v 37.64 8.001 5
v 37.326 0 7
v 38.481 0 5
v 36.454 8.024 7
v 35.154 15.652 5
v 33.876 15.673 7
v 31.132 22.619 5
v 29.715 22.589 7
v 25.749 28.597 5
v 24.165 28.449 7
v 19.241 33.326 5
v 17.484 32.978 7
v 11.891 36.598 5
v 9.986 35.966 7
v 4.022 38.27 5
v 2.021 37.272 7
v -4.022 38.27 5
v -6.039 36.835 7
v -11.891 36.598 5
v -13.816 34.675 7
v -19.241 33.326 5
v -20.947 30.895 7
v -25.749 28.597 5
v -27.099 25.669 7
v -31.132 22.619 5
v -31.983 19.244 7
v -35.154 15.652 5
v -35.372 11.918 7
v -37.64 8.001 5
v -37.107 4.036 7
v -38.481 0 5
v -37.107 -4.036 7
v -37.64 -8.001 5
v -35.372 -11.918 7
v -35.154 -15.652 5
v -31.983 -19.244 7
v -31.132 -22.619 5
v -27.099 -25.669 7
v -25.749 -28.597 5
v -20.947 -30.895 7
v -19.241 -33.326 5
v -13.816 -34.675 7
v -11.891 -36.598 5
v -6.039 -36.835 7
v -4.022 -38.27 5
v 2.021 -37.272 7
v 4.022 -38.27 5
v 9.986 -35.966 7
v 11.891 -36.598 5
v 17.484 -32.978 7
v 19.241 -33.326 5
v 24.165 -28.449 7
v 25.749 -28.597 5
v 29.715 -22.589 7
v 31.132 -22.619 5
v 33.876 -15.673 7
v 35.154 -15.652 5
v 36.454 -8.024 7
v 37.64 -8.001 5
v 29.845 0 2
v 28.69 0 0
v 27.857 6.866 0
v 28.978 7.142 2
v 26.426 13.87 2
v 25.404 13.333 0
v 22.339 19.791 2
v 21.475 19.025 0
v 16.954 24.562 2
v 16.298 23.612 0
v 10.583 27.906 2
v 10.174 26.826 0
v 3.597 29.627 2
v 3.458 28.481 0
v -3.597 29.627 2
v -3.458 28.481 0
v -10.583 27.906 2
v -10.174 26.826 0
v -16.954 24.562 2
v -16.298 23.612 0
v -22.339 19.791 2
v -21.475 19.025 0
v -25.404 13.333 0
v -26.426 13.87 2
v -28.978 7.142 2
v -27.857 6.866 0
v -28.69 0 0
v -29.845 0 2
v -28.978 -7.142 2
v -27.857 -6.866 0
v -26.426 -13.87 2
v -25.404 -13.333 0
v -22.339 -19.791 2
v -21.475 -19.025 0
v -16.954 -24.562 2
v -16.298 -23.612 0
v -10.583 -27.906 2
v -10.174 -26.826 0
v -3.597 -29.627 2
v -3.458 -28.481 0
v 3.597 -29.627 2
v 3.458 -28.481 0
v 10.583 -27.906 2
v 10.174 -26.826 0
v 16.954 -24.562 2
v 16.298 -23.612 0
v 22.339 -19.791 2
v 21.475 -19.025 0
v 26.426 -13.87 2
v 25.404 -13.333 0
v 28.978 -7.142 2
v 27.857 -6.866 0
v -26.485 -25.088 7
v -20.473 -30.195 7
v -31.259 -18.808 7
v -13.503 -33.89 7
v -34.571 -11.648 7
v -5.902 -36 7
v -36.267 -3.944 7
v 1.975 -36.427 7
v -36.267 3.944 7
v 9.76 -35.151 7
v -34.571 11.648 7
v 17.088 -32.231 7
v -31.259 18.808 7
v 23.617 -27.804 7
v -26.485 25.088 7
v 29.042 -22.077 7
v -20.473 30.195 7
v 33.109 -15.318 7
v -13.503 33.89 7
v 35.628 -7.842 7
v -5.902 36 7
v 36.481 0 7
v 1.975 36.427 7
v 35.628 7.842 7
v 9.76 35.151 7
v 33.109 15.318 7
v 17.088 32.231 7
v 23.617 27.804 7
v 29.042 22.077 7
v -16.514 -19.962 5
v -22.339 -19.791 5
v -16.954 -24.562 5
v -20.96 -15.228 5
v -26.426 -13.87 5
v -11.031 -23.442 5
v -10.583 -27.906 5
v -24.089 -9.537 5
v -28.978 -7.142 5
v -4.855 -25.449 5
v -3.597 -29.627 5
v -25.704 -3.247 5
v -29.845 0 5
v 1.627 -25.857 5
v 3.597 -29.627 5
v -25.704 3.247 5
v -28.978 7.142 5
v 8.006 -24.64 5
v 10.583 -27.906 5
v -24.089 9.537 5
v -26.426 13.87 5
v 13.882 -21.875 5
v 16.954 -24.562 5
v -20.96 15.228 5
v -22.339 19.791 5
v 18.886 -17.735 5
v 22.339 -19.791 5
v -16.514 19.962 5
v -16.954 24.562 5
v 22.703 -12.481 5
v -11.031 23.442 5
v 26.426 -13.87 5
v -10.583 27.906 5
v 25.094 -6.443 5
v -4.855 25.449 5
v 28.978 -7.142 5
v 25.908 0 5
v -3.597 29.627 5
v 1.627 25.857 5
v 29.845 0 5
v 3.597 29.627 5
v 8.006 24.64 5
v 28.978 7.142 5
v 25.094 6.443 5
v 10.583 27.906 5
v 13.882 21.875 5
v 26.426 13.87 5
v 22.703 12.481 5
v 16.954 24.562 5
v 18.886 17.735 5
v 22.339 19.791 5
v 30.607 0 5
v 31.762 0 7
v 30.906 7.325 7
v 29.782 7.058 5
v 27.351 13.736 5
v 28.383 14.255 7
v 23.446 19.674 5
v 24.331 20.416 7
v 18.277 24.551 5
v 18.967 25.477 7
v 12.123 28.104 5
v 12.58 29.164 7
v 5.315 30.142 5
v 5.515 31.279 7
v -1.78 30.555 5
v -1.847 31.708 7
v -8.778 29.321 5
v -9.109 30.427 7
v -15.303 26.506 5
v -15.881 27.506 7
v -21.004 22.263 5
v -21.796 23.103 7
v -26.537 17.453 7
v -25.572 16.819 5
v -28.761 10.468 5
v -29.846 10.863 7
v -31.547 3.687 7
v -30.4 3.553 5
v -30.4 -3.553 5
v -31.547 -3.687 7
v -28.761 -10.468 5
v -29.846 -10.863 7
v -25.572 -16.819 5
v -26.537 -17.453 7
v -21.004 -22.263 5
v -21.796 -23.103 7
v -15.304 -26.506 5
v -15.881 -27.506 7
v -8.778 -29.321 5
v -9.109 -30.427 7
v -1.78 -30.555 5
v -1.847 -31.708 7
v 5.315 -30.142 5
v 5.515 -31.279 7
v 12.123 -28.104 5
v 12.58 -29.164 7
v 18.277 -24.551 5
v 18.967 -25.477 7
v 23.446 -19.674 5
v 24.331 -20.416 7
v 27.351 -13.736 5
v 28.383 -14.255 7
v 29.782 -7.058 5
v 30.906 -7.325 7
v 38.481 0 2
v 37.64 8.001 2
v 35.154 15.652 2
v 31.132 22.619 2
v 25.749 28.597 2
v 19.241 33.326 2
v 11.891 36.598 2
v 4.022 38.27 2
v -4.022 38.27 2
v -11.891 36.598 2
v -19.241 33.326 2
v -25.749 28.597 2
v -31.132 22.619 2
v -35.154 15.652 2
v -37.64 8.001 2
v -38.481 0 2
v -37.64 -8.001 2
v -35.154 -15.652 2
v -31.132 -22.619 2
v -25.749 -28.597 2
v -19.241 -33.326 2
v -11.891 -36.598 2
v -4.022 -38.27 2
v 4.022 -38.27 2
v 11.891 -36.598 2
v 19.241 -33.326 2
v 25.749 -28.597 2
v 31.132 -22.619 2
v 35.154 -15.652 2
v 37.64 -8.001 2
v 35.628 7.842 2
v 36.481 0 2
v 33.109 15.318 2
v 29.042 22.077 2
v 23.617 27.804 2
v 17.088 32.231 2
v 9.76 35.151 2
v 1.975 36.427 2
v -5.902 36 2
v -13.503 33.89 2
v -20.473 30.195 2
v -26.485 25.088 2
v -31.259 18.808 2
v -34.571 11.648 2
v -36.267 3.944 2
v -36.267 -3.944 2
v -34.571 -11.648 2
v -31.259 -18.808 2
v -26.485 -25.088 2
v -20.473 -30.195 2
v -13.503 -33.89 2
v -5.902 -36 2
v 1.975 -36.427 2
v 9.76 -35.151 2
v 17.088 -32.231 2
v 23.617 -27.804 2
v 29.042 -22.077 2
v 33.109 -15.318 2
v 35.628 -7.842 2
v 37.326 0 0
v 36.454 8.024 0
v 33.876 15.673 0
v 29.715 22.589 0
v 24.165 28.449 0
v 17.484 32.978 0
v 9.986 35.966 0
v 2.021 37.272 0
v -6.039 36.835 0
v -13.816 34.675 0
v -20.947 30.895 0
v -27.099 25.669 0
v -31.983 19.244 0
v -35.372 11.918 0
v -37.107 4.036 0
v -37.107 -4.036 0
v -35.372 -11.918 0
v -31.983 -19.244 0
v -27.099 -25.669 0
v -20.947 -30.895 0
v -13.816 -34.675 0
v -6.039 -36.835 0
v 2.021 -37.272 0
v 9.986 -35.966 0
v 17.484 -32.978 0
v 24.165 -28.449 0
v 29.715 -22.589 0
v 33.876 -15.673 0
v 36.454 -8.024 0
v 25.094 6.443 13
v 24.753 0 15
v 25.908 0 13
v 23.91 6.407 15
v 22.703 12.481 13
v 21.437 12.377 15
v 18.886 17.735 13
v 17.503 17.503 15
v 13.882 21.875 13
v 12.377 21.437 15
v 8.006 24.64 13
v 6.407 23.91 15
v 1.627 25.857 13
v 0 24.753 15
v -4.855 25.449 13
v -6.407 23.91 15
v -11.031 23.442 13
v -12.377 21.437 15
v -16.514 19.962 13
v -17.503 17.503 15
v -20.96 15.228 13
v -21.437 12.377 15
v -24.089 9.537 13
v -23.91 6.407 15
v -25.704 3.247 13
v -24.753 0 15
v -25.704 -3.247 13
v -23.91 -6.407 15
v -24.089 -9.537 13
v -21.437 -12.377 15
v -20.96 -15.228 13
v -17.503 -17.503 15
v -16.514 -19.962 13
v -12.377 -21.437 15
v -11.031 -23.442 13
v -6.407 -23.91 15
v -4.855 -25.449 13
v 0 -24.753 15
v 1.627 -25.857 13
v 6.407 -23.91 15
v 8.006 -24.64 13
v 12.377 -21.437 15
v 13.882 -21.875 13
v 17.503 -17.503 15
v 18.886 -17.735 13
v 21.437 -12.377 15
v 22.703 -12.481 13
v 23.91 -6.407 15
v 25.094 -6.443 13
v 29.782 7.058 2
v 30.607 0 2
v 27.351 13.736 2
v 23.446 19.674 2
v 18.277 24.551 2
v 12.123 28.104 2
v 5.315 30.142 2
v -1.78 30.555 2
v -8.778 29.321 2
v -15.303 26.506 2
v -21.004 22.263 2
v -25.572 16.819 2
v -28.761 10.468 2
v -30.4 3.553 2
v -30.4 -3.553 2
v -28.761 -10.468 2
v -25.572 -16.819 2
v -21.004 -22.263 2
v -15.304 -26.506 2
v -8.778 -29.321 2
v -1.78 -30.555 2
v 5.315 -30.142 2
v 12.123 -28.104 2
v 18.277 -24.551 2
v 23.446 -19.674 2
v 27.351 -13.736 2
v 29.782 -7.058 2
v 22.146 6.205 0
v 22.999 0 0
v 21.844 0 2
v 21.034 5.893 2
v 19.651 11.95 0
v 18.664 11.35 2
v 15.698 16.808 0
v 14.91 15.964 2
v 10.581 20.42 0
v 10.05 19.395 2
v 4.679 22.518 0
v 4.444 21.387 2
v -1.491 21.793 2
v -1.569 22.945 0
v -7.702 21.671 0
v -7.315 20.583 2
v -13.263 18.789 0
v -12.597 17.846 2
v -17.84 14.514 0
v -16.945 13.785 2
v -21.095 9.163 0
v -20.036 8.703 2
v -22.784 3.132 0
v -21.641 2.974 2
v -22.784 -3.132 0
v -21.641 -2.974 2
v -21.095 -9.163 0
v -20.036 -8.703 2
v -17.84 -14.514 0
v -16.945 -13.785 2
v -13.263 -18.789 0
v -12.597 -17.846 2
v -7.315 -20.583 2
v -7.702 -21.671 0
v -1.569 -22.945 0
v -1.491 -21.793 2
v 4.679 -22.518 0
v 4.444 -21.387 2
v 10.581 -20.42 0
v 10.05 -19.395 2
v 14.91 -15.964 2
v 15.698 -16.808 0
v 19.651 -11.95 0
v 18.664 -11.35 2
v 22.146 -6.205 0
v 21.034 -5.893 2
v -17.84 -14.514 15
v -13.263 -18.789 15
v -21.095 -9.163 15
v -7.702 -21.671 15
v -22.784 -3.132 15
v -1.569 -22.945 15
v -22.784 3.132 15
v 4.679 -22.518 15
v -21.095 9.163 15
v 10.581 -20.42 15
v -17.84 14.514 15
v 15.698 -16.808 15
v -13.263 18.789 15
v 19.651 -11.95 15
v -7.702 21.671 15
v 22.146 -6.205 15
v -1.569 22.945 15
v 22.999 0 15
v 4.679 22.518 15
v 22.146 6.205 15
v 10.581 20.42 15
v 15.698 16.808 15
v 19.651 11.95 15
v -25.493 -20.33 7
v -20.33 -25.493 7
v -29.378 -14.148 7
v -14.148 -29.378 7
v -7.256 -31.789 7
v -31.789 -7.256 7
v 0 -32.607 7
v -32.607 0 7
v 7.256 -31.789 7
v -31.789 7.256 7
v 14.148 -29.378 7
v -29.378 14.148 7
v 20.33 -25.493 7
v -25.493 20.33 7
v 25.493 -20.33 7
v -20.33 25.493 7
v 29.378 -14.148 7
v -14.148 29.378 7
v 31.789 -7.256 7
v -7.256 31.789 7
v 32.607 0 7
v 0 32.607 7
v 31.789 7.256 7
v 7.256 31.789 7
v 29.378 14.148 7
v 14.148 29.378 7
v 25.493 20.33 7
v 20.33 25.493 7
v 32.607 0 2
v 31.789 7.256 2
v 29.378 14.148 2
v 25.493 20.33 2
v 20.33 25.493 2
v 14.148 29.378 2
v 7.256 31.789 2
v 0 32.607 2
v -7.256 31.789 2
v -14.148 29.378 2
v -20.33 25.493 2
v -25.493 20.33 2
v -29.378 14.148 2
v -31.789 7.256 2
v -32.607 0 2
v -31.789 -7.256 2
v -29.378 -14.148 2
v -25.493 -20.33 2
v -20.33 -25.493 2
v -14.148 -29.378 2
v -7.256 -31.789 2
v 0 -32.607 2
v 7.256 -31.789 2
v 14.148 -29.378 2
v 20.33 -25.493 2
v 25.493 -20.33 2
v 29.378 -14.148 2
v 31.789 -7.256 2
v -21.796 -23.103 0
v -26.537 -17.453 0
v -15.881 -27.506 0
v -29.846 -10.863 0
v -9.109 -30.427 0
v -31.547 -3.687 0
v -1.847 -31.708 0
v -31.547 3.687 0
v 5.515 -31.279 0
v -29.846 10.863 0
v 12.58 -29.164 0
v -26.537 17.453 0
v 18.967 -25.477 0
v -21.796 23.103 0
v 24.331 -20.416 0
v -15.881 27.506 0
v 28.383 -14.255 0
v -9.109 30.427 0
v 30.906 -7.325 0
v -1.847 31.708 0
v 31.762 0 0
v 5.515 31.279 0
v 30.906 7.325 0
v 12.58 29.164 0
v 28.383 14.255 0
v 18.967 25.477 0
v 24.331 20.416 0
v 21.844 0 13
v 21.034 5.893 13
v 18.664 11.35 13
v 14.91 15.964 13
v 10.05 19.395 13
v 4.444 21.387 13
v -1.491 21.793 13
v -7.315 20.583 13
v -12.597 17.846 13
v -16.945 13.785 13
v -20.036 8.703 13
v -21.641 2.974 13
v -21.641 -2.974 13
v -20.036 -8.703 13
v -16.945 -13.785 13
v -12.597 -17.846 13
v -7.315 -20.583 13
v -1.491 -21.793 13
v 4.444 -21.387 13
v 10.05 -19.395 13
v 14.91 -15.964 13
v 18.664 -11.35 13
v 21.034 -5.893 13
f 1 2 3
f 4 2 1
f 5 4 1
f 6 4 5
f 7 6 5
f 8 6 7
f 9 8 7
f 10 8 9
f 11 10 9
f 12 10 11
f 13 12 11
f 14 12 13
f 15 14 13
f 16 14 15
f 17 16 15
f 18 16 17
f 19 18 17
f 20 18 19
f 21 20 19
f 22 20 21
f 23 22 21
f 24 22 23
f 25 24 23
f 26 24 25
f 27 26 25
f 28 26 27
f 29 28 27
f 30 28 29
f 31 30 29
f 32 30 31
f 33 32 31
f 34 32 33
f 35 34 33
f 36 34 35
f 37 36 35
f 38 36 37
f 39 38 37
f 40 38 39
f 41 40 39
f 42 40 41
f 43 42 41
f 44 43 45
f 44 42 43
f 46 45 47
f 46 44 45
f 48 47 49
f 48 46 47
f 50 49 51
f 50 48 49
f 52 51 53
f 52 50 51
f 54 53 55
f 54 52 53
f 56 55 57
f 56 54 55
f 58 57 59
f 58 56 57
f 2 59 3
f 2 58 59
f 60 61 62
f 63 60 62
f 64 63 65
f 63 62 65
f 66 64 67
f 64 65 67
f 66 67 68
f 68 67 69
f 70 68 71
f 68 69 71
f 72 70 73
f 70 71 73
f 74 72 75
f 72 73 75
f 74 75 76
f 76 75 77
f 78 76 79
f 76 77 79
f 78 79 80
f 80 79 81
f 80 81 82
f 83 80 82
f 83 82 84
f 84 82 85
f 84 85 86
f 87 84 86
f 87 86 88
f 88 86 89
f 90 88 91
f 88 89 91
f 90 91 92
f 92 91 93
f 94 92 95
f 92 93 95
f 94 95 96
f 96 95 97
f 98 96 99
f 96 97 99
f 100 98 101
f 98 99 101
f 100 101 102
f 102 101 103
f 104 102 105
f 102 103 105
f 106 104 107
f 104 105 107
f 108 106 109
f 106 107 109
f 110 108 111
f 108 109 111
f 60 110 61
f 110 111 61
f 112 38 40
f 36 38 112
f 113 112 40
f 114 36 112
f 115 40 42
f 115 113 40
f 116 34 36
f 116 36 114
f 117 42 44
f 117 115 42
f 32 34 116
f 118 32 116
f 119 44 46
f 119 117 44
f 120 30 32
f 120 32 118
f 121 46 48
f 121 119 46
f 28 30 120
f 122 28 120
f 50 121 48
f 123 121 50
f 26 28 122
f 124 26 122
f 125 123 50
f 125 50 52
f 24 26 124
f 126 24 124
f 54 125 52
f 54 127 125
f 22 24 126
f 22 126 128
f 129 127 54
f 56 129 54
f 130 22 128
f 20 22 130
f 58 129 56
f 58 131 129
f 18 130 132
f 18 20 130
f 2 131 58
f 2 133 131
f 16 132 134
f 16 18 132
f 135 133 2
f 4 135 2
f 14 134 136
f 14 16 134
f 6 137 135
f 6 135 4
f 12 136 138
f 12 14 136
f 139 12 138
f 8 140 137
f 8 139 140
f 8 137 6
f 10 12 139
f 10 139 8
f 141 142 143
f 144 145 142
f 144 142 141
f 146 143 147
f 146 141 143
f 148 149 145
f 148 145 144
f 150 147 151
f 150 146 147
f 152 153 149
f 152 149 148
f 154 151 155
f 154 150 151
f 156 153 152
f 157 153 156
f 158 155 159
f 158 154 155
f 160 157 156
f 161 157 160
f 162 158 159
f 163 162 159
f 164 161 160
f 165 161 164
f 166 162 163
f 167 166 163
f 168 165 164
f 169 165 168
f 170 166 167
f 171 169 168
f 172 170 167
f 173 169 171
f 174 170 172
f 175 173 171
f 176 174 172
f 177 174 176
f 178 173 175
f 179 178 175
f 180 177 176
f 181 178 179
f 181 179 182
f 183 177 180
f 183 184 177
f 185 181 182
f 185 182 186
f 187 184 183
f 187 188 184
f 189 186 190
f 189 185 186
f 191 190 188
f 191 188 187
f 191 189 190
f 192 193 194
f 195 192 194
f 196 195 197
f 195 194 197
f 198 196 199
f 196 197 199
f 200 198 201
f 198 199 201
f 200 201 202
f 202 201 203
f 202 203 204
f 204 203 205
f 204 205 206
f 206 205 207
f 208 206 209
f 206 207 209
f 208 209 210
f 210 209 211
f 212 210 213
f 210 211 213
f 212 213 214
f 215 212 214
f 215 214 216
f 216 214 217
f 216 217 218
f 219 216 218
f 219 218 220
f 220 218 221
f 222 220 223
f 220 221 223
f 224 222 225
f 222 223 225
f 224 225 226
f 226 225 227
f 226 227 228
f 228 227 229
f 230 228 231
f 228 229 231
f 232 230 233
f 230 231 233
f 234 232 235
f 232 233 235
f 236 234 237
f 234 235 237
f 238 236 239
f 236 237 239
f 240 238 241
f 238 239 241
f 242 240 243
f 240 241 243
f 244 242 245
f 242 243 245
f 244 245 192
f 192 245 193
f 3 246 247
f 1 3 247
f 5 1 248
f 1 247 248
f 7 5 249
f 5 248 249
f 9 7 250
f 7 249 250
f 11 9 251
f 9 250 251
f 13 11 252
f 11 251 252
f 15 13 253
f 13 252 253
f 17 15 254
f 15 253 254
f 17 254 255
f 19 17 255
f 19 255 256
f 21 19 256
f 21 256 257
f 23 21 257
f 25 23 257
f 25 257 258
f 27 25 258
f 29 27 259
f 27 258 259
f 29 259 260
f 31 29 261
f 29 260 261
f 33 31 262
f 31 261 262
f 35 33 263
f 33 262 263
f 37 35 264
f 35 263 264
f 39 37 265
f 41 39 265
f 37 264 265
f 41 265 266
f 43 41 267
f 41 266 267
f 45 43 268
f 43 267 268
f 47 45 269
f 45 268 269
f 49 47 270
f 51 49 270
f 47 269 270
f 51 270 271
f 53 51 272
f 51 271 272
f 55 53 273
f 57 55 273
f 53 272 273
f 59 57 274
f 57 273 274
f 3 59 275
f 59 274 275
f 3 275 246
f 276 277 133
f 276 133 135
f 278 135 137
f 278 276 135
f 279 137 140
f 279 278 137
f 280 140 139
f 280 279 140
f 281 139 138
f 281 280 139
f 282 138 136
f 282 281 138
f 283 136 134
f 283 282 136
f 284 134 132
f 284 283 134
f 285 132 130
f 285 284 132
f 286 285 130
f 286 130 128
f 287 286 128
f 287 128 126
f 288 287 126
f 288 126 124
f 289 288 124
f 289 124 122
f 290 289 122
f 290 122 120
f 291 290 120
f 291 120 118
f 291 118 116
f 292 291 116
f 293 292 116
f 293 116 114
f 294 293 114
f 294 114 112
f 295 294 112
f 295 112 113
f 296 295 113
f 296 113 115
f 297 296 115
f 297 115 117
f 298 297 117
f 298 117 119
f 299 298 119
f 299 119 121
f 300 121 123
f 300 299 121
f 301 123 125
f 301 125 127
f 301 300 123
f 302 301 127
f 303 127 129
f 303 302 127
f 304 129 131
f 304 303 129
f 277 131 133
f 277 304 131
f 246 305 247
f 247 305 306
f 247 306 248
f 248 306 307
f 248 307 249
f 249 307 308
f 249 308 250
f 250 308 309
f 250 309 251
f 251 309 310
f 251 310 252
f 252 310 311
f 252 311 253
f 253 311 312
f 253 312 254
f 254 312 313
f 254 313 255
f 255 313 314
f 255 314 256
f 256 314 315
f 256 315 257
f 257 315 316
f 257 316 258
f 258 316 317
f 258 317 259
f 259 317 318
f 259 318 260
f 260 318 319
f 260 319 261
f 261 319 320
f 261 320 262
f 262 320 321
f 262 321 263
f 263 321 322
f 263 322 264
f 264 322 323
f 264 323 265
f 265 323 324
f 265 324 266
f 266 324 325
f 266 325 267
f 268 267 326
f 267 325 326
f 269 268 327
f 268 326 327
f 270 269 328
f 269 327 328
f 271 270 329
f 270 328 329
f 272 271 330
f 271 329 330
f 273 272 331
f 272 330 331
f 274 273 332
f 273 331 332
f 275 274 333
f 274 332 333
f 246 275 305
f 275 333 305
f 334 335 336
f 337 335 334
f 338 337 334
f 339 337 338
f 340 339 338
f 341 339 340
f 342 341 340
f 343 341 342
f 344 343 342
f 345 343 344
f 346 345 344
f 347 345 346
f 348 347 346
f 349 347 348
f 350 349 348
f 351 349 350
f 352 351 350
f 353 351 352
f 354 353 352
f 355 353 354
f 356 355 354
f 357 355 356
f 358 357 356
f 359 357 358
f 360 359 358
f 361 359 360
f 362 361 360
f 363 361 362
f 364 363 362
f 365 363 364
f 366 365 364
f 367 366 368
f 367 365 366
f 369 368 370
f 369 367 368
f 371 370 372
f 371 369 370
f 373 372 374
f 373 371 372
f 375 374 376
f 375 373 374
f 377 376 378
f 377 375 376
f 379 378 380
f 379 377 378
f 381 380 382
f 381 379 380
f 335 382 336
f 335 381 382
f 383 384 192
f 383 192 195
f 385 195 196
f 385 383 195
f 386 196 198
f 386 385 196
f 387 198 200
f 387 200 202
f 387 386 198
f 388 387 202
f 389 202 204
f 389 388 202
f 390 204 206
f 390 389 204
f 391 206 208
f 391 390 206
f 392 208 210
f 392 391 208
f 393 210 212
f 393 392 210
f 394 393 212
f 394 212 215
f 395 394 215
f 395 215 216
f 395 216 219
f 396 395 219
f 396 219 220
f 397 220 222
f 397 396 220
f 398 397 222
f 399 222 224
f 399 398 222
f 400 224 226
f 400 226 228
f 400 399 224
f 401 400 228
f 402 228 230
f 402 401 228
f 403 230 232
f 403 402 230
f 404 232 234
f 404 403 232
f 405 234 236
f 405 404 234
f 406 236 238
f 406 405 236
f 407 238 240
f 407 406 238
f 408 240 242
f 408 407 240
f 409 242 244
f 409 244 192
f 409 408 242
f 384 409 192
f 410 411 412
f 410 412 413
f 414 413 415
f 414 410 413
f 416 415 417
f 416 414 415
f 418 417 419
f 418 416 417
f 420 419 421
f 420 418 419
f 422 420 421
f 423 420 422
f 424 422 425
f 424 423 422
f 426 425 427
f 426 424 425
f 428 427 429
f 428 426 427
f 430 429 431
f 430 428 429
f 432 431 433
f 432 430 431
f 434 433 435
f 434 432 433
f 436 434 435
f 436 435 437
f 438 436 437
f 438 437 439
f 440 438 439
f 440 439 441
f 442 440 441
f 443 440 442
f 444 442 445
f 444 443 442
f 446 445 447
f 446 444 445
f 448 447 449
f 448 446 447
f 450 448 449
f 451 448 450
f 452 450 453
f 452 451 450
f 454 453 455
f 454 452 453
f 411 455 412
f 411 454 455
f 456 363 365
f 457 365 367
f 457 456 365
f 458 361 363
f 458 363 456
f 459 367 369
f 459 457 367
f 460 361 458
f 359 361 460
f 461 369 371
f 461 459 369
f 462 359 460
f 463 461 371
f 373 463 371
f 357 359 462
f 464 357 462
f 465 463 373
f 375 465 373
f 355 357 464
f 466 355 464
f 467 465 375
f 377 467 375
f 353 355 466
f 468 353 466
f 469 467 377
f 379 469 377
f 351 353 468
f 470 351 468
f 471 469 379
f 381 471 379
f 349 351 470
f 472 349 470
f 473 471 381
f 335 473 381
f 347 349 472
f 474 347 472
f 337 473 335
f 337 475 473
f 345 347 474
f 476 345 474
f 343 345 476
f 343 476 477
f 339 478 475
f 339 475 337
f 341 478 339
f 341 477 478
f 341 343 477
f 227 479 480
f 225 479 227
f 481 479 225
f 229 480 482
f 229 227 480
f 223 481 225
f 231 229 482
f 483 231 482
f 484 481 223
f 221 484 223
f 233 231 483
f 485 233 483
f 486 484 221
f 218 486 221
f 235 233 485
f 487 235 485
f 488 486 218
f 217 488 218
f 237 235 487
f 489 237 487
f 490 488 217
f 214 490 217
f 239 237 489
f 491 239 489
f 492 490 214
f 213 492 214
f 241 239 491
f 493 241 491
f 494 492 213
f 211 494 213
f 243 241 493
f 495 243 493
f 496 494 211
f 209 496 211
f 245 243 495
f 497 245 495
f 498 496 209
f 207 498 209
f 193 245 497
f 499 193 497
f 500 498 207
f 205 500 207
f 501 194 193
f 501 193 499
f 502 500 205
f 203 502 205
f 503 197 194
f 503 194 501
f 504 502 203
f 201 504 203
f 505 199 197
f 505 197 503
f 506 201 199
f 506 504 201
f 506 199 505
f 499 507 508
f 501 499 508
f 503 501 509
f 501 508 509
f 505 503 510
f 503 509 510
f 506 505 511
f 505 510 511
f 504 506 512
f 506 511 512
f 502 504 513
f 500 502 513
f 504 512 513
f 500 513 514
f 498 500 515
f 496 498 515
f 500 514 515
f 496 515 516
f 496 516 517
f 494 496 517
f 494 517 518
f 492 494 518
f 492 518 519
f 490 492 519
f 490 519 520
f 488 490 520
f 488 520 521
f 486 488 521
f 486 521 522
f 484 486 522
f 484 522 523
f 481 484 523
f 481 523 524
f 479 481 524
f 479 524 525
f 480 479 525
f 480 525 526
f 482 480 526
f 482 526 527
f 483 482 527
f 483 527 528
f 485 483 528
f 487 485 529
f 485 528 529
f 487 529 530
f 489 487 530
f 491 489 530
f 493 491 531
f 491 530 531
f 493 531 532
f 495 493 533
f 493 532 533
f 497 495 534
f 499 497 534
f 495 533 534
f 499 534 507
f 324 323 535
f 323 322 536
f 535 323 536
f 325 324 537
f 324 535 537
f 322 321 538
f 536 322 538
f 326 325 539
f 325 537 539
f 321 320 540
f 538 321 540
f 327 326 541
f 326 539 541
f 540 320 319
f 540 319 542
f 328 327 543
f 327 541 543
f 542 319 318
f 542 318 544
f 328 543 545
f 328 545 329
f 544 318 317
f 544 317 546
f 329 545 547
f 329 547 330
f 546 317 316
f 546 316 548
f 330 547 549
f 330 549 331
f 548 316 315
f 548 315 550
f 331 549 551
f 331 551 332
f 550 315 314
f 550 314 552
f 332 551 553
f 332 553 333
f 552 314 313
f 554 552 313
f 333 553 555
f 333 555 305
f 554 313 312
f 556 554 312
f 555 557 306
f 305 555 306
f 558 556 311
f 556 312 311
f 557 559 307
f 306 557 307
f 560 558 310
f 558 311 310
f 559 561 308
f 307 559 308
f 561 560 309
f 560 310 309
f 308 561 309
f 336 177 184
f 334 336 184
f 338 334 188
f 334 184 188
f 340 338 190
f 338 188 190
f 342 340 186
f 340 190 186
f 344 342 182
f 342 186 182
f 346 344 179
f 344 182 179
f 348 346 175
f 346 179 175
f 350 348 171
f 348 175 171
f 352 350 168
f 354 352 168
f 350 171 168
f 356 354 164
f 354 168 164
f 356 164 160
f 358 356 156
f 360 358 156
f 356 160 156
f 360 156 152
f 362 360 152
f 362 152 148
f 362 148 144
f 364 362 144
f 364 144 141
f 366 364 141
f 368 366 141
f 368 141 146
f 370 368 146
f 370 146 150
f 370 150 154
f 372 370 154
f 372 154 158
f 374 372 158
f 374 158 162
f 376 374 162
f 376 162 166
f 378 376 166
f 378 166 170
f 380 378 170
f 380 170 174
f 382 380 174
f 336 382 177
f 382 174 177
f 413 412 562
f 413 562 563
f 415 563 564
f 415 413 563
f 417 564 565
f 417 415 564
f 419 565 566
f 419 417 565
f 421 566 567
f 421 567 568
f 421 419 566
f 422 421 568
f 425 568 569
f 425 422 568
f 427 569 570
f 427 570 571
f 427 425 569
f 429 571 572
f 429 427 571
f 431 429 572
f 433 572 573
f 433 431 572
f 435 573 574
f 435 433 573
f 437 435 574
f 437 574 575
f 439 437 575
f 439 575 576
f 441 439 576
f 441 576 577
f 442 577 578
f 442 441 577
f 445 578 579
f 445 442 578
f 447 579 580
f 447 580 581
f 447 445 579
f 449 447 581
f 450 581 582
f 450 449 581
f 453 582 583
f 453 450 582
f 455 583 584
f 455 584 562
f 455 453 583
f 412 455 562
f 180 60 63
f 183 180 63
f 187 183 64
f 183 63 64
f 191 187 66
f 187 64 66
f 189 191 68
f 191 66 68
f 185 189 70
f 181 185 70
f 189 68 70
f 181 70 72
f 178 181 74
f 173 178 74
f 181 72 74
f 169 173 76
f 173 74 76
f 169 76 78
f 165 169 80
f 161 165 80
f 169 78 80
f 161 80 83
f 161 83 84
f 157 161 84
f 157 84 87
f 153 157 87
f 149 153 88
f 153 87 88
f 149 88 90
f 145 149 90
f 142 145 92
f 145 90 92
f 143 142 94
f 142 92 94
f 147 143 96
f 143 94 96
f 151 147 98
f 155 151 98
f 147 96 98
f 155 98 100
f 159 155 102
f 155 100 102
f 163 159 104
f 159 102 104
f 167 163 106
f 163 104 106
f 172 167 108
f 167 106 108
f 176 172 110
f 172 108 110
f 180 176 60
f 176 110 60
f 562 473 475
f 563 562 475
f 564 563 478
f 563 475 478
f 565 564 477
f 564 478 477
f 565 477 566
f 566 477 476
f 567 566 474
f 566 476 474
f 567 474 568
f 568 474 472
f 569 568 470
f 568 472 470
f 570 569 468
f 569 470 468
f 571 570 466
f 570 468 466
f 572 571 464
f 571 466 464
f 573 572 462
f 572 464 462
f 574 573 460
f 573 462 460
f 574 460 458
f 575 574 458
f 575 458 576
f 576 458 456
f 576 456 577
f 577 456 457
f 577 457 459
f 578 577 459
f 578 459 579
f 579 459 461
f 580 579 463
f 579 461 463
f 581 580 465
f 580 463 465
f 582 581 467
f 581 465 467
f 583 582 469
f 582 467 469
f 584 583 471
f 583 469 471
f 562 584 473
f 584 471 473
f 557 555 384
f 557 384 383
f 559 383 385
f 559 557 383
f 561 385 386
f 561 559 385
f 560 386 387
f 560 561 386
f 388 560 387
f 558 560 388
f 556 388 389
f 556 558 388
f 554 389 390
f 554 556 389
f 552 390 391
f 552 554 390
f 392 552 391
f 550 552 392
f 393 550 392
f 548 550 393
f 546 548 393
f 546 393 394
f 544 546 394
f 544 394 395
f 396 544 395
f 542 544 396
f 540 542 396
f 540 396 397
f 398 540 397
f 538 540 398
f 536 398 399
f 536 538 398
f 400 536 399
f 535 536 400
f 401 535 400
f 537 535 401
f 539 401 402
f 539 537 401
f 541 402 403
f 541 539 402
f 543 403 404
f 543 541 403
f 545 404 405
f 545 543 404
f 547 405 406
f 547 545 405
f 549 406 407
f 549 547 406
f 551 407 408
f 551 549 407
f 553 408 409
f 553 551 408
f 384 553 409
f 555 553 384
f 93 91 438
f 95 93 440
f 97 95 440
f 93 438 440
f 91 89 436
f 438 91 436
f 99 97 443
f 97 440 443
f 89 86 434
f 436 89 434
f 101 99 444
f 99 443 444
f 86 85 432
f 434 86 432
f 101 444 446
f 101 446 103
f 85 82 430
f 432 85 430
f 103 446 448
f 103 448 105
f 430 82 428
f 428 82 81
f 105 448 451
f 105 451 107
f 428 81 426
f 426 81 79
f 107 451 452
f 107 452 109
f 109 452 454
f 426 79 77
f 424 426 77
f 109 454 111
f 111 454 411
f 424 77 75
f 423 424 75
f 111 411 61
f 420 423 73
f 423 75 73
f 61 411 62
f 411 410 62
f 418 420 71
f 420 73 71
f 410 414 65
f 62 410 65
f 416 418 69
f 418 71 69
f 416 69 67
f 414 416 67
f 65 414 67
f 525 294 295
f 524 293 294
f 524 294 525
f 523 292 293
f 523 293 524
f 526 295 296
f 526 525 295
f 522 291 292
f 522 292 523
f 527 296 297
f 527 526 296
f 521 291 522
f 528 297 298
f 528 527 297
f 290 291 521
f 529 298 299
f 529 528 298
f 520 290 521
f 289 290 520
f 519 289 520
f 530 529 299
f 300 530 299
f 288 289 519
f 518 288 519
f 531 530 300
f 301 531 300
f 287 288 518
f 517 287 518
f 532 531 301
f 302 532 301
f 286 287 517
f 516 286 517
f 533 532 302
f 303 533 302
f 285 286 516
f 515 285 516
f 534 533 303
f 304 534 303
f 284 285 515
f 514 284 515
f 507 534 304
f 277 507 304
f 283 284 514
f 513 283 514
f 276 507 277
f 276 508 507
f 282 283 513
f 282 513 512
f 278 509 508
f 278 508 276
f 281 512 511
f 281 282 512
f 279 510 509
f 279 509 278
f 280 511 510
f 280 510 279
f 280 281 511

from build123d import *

# Parameters (mm, degrees)
F0_R       = 38.481
F0_R_2     = 36.481
F0_R_3     = 32.607
F0_R_4     = 30.607
F1_DEPTH   = 2
F2_DEPTH   = 7
F3_R       = 29.845
F3_R_2     = 25.908
F3_R_3     = 21.844
F4_DEPTH   = 5
F5_DEPTH   = 15
F6_SIZE2   = 1.1547005384
F6_SIZE    = 2
F6_2_SIZE2 = 1.1547005384
F6_2_SIZE  = 2
F7_SIZE2   = 1.1547005384
F7_SIZE    = 2
F8_SIZE2   = 1.1547005384
F8_SIZE    = 2
F9_SIZE2   = 1.1547005384
F9_SIZE    = 2


with BuildPart() as f1:
    # F0 (on Top) → F1 (new body)
    with BuildSketch(Plane.XY):
        Circle(F0_R)
        Circle(F0_R_2, mode=Mode.SUBTRACT)
        Circle(F0_R_2)
        Circle(F0_R_3, mode=Mode.SUBTRACT)
        Circle(F0_R_3)
        Circle(F0_R_4, mode=Mode.SUBTRACT)
    extrude(amount=F1_DEPTH)

    # F0 (on Top) → F2 (join)
    with BuildSketch(Plane.XY):
        Circle(F0_R)
        Circle(F0_R_2, mode=Mode.SUBTRACT)
        Circle(F0_R_3)
        Circle(F0_R_4, mode=Mode.SUBTRACT)
    extrude(amount=F2_DEPTH)

    # F8
    f8_edges = [f1.edges().sort_by_distance(p)[0] for p in [
        (-38.481, 0, 7),
        (-38.481, 0, 0),
    ]]
    f8_side = f1.faces().sort_by_distance((-38.481, 0, 3.5))[0]
    chamfer(f8_edges, length=F8_SIZE, length2=F8_SIZE2, reference=f8_side)

    # F9
    f9_edges = [f1.edges().sort_by_distance(p)[0] for p in [
        (-30.607, 0, 7),
        (-30.607, 0, 0),
    ]]
    f9_side = f1.faces().sort_by_distance((-30.607, 0, 3.5))[0]
    chamfer(f9_edges, length=F9_SIZE, length2=F9_SIZE2, reference=f9_side)


with BuildPart() as f4:
    # F3 (on Top) → F4 (new body)
    with BuildSketch(Plane.XY):
        Circle(F3_R)
        Circle(F3_R_2, mode=Mode.SUBTRACT)
        Circle(F3_R_2)
        Circle(F3_R_3, mode=Mode.SUBTRACT)
    extrude(amount=F4_DEPTH)

    # F3 (on Top) → F5 (join)
    with BuildSketch(Plane.XY):
        Circle(F3_R_2)
        Circle(F3_R_3, mode=Mode.SUBTRACT)
    extrude(amount=F5_DEPTH)

    # F6
    f6_edges = [f4.edges().sort_by_distance(p)[0] for p in [
        (-25.908, 0, 15),
    ]]
    f6_side = f4.faces().sort_by_distance((-25.908, 0, 10))[0]
    chamfer(f6_edges, length=F6_SIZE, length2=F6_SIZE2, reference=f6_side)

    # F6#2
    f6_2_edges = [f4.edges().sort_by_distance(p)[0] for p in [
        (-21.844, 0, 15),
        (-21.844, 0, 0),
    ]]
    f6_2_side = f4.faces().sort_by_distance((-21.844, 0, 7.5))[0]
    chamfer(f6_2_edges, length=F6_2_SIZE, length2=F6_2_SIZE2, reference=f6_2_side)

    # F7
    f7_edges = [f4.edges().sort_by_distance(p)[0] for p in [
        (-29.845, 0, 0),
    ]]
    f7_side = f4.faces().sort_by_distance((-29.845, 0, 2.5))[0]
    chamfer(f7_edges, length=F7_SIZE, length2=F7_SIZE2, reference=f7_side)


solid = Compound([f1.part, f4.part])
